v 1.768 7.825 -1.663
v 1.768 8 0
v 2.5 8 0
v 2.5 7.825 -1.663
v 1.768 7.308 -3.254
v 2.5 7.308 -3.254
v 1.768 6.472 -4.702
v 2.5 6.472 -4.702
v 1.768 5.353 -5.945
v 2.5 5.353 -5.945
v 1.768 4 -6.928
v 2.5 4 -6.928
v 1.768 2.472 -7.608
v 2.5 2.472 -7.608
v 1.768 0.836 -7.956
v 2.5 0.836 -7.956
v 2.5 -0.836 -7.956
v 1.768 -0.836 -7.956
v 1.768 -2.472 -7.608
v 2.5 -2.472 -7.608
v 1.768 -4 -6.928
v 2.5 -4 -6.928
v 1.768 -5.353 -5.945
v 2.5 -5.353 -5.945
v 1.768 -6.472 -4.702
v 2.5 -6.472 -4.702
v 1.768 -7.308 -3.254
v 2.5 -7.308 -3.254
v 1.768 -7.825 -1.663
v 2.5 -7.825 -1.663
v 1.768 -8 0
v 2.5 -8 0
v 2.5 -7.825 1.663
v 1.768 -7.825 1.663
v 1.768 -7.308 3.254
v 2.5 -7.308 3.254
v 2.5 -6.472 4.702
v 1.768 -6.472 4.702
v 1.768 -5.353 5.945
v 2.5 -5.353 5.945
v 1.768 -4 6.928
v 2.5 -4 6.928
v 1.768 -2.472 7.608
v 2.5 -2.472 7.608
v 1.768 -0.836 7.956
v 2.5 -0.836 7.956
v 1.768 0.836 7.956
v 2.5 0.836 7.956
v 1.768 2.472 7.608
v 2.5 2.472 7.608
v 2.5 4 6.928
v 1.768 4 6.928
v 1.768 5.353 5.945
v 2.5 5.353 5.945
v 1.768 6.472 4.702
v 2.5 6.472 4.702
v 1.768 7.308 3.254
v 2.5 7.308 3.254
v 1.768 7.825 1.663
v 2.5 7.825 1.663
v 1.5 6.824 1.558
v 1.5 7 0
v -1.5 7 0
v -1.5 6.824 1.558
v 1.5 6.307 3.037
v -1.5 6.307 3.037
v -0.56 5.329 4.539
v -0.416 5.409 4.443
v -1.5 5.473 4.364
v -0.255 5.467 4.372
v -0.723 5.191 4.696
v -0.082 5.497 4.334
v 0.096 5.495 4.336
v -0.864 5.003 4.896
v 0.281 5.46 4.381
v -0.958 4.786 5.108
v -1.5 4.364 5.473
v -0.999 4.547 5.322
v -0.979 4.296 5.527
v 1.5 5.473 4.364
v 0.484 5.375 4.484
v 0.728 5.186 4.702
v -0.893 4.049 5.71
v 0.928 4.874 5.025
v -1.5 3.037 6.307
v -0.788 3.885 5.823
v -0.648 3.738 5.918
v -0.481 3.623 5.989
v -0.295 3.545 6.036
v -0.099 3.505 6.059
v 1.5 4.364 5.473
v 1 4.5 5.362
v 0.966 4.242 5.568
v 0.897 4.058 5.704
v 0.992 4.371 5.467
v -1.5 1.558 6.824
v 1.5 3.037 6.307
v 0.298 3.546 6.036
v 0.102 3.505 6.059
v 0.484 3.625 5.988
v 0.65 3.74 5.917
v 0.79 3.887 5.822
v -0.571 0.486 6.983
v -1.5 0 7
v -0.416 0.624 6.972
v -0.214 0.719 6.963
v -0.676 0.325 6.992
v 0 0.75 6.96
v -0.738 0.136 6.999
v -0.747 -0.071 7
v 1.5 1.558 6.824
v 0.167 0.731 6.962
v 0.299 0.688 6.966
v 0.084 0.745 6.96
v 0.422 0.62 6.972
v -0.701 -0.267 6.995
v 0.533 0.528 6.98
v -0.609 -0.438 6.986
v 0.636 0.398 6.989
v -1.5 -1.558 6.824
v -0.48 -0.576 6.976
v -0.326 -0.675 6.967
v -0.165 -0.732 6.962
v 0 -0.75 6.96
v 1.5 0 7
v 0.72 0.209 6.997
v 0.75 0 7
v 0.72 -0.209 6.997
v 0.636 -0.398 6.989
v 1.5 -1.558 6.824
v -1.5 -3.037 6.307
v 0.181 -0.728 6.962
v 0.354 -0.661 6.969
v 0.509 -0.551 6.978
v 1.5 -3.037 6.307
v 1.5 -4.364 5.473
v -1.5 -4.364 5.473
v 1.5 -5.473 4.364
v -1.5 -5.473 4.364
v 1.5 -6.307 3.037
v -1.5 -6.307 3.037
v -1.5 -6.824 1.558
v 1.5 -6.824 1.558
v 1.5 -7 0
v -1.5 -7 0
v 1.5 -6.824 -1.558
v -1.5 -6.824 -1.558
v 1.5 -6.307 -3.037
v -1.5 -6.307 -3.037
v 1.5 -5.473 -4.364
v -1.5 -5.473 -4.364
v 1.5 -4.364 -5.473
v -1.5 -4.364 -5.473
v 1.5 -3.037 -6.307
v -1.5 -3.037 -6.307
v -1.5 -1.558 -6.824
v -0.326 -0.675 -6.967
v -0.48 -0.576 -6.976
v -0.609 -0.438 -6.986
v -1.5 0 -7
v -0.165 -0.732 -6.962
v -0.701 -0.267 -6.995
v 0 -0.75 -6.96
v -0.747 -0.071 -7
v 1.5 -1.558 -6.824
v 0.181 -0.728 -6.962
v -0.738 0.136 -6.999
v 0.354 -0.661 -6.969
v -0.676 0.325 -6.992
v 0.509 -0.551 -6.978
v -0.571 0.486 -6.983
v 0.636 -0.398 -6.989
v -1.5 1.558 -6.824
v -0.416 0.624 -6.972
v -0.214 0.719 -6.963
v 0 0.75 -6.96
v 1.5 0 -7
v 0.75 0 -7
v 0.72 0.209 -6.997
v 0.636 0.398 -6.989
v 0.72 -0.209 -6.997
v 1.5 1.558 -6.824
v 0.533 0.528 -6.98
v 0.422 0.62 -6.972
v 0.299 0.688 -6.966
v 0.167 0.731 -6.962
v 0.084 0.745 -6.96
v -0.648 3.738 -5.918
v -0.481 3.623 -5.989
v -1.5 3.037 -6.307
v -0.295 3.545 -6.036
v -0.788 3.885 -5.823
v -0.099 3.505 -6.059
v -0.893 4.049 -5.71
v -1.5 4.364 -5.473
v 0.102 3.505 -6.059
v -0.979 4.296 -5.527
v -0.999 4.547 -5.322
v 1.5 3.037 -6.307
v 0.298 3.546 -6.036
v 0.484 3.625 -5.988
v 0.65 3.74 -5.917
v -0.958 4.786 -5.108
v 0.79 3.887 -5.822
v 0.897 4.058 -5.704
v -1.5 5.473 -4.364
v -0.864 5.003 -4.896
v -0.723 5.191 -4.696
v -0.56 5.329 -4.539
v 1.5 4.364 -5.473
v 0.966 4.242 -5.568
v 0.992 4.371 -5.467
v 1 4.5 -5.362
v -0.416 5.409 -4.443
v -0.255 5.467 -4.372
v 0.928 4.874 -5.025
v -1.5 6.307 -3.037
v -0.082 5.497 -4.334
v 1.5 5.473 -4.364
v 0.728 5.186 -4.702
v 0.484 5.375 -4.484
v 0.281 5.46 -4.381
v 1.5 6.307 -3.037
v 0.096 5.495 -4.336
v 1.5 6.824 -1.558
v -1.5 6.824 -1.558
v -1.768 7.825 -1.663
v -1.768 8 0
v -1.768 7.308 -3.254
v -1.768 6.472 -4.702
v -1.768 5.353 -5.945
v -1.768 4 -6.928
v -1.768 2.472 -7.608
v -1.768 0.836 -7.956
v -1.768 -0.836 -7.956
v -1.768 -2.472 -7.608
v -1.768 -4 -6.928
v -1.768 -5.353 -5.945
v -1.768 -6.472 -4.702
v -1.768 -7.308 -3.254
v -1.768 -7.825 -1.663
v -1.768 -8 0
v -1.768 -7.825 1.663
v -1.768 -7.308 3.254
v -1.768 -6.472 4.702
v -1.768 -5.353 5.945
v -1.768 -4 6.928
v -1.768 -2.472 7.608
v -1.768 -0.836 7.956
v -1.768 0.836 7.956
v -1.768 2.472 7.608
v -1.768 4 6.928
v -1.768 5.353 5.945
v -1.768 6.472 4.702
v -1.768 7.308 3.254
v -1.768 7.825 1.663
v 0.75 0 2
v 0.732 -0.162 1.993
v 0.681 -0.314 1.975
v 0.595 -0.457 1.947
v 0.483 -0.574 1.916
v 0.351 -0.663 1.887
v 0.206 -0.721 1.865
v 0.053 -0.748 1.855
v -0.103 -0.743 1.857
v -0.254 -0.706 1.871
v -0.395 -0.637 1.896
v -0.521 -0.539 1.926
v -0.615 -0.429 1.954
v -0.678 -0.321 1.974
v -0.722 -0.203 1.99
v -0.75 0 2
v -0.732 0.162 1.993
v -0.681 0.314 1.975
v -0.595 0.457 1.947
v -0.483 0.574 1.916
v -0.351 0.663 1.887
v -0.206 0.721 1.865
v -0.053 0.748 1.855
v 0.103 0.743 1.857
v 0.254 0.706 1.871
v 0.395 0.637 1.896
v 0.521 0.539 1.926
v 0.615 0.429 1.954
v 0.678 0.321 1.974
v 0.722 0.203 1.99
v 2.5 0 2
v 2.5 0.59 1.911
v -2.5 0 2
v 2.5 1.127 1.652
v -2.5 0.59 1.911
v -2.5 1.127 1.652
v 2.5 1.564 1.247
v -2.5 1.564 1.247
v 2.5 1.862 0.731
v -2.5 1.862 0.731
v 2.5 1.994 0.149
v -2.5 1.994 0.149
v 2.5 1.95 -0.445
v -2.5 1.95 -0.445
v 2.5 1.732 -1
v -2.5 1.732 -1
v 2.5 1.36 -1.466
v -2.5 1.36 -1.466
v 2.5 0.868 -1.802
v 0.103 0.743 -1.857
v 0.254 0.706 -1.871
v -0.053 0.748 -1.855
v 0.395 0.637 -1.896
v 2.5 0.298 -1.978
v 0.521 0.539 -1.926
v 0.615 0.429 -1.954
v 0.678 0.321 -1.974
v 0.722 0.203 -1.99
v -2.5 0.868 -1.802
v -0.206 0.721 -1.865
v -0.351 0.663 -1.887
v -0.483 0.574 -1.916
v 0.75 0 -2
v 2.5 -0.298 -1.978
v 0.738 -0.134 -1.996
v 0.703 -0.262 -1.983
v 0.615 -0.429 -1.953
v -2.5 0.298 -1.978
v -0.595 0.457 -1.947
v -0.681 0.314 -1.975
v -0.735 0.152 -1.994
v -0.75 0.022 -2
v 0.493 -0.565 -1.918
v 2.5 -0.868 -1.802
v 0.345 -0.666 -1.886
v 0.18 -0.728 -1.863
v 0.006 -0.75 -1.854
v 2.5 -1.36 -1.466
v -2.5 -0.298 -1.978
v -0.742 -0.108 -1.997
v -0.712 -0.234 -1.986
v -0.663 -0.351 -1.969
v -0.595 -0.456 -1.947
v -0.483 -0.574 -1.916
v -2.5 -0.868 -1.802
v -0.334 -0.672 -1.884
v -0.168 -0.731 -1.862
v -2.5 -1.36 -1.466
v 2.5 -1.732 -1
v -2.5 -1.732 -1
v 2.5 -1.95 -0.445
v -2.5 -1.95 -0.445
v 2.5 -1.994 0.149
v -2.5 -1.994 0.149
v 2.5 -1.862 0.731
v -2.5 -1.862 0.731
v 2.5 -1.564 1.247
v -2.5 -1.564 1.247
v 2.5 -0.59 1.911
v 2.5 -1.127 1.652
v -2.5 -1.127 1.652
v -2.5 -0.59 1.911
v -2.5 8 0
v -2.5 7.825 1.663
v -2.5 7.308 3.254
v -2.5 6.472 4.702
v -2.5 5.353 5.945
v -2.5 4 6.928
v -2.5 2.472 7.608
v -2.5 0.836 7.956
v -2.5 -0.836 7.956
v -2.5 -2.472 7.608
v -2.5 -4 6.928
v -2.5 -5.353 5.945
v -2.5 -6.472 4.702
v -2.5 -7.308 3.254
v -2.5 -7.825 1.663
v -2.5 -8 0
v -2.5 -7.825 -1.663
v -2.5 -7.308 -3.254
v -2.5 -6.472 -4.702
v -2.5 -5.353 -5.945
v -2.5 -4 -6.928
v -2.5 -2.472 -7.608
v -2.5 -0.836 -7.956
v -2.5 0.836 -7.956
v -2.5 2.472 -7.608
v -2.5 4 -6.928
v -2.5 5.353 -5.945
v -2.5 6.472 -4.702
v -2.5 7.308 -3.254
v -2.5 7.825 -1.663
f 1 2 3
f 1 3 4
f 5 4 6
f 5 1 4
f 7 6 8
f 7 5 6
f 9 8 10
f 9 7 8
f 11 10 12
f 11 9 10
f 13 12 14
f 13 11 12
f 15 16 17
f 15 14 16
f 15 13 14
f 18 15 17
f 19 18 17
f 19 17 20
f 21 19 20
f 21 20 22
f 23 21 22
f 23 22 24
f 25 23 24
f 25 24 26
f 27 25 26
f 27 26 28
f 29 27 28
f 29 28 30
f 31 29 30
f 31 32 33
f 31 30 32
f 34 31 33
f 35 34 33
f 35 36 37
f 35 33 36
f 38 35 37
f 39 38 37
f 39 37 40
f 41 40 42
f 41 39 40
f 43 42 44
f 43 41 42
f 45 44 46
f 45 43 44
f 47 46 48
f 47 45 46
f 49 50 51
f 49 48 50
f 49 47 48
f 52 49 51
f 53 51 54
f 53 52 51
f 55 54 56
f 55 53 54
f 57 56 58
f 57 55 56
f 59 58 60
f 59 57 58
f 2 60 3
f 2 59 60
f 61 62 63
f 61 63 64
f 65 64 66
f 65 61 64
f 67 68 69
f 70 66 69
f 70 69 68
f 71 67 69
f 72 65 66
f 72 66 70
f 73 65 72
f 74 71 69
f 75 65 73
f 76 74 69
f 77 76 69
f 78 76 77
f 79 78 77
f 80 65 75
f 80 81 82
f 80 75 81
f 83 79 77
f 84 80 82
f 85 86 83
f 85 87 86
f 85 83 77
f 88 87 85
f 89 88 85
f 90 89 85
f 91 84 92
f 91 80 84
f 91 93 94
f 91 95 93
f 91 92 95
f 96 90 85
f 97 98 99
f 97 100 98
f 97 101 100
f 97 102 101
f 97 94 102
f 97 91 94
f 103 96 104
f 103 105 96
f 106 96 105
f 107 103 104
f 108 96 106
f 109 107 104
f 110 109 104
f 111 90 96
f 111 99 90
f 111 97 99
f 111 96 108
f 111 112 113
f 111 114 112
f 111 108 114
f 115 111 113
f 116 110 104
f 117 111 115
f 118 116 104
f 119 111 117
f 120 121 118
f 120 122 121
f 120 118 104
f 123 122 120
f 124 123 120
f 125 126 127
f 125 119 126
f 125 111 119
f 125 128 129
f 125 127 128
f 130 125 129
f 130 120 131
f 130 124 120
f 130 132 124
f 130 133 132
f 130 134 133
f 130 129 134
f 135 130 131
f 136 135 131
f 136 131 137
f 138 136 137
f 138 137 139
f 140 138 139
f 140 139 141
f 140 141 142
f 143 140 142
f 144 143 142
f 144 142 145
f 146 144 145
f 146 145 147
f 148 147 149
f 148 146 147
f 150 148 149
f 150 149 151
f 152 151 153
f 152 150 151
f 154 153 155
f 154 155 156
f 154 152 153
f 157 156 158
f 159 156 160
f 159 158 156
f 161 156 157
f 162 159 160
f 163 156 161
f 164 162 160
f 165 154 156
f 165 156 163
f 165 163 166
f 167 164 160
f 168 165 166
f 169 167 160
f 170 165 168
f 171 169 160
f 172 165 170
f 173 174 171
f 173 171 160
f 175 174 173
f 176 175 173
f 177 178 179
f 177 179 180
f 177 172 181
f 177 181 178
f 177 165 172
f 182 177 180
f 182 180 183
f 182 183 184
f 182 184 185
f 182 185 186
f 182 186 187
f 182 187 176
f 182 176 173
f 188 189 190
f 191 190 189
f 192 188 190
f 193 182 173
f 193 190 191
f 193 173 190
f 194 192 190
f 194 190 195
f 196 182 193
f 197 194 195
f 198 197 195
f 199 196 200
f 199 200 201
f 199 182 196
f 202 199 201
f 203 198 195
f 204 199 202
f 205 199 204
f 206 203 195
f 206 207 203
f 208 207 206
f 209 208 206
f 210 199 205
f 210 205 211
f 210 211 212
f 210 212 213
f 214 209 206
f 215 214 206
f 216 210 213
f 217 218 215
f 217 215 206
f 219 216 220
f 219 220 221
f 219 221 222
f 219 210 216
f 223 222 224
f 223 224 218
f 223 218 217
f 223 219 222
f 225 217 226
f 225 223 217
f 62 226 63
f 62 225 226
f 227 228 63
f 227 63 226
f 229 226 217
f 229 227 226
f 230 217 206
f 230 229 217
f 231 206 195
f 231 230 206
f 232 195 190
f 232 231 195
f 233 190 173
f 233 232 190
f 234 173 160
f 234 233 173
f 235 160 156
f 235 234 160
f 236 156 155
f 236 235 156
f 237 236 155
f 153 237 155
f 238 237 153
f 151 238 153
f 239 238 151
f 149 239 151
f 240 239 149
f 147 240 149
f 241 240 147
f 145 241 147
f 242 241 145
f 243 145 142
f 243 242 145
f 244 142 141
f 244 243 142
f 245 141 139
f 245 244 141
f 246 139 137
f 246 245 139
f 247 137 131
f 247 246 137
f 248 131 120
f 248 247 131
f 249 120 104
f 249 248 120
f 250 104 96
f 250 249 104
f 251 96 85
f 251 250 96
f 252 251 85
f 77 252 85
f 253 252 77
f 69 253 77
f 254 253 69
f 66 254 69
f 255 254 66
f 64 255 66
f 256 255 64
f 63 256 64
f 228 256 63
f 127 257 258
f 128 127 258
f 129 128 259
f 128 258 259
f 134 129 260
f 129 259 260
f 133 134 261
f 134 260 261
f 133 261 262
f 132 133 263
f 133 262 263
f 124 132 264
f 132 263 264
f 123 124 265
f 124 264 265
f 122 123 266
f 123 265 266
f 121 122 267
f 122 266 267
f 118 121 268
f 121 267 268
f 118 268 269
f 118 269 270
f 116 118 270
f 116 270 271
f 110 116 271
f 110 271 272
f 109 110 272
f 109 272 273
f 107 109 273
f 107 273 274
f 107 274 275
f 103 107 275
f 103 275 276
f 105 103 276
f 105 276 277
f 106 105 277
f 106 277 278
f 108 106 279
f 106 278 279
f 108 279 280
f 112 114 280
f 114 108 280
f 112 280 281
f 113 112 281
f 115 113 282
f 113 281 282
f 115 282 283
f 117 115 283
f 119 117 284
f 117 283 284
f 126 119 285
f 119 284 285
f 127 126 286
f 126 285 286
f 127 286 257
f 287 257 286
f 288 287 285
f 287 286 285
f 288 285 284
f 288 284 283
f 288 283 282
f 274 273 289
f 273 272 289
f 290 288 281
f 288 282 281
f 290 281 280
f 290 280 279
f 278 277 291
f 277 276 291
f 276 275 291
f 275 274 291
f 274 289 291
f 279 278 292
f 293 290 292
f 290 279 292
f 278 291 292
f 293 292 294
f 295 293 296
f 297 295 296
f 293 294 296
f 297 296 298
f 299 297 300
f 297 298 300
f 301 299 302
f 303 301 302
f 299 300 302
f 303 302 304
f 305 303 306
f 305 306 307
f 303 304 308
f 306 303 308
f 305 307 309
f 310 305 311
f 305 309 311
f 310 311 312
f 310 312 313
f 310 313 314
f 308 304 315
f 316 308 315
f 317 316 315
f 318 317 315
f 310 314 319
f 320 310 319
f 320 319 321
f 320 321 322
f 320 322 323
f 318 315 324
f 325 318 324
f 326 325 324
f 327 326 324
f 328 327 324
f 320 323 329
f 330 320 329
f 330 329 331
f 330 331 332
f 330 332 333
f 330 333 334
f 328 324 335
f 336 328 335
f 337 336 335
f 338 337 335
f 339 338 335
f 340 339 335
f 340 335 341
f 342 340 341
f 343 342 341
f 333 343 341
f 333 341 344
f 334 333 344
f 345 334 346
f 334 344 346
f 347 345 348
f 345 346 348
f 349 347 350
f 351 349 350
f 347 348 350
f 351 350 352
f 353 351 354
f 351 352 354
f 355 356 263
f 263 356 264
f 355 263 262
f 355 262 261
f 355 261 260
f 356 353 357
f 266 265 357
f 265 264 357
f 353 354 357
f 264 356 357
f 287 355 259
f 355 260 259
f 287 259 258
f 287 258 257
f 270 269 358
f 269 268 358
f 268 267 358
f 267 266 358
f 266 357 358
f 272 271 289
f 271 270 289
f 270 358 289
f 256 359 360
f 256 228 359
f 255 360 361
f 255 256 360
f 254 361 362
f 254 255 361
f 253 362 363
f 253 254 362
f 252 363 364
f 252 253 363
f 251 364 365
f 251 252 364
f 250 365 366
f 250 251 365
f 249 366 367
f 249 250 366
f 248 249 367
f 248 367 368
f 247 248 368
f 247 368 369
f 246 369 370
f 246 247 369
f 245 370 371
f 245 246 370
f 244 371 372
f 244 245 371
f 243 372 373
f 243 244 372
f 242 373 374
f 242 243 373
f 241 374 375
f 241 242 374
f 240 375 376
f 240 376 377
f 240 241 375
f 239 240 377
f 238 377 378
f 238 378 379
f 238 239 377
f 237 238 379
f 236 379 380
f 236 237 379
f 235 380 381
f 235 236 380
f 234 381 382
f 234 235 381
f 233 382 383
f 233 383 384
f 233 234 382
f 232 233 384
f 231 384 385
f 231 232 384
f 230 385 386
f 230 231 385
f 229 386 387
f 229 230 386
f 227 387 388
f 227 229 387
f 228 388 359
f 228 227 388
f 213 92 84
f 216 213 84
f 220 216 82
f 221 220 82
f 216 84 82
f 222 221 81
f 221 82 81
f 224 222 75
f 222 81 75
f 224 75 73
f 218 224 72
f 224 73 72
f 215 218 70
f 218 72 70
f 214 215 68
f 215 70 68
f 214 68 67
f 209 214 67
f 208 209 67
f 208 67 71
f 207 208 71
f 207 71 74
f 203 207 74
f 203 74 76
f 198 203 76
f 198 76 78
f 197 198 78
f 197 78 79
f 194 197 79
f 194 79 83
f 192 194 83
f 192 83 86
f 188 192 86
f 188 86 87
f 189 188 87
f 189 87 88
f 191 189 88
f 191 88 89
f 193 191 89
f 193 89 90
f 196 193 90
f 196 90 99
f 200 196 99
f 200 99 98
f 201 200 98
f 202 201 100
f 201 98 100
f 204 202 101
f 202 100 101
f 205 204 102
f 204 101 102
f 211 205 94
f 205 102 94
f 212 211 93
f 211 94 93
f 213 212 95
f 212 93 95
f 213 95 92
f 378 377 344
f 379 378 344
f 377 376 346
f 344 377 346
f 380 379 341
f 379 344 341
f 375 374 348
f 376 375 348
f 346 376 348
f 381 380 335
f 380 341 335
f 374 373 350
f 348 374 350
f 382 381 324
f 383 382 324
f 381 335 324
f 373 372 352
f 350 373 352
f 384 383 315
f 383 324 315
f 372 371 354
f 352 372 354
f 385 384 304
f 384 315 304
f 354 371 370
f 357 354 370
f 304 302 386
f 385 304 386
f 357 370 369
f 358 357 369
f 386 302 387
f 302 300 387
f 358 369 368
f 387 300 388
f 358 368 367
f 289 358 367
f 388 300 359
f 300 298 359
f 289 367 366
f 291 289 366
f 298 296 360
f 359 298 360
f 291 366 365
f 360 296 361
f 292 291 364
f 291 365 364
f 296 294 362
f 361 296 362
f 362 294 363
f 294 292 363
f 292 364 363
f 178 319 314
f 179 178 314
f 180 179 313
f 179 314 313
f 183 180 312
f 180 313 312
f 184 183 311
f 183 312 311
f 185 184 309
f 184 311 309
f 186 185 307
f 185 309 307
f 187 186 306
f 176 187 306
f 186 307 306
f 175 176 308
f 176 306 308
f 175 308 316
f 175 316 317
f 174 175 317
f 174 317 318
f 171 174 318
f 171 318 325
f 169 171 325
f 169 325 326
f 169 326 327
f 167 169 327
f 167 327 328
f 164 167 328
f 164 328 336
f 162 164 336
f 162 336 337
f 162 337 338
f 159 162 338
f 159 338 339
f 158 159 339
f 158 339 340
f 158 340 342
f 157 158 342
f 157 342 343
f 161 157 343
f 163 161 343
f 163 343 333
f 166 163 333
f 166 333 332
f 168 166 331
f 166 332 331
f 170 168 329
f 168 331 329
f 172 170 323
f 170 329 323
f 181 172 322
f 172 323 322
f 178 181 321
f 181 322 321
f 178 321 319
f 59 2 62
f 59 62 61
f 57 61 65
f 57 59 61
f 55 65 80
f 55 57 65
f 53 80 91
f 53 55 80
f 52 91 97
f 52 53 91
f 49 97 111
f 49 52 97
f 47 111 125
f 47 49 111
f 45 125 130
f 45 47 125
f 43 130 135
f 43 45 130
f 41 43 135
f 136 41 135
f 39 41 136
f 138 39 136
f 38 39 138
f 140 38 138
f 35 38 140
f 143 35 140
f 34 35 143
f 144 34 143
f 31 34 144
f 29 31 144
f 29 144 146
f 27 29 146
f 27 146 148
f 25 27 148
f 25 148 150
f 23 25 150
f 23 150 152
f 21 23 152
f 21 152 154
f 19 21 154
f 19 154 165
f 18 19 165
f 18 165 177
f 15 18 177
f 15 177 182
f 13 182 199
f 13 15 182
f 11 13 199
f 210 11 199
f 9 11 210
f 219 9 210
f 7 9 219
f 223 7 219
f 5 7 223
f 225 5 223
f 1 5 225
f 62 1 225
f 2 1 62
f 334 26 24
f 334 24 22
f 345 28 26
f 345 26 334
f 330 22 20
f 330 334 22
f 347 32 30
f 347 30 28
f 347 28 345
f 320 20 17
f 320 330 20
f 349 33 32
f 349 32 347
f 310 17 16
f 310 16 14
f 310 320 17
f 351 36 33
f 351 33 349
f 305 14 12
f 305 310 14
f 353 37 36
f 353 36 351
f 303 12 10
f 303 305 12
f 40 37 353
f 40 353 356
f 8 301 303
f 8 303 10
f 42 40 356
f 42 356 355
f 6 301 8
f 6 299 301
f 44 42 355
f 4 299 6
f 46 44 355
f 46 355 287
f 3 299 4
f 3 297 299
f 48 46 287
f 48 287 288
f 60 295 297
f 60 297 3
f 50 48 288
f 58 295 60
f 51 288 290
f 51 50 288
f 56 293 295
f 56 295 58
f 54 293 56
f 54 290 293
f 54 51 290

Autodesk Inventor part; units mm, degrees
ref_plane "YZ Plane" through (0, 0, 0) normal (1, 0, 0) x (0, 1, 0)
ref_plane "XZ Plane" through (0, 0, 0) normal (0, 1, 0) x (-1, 0, 0)
ref_plane "XY Plane" through (0, 0, 0) normal (0, 0, 1) x (1, 0, 0)
sketch "Sketch1" plane through (0, 0, 0) normal (0, 0, 1) x (1, 0, 0)
  line L0 (-2.5, 0) -> (-2.5, 8)
  line L1 (-2.5, 8) -> (-1.7679, 8)
  line L2 (-1.7679, 8) -> (-1.5, 7)
  line L3 (-1.5, 7) -> (0, 7)
  line L4 (0, 0) -> (0, 14.5205) construction
  line L5 (-2.5, 0) -> (2.5, 0)
  line L6 (2.5, 0) -> (2.5, 8)
  line L7 (2.5, 8) -> (1.7679, 8)
  line L8 (1.7679, 8) -> (1.5, 7)
  line L9 (1.5, 7) -> (0, 7)
  dimension "d0" = 5
  dimension "d1" = 16
  dimension "d2" = 14
  dimension "d3" = 3
  dimension "d4" = 15
revolve "Revolution1" add sketch "Sketch1" angle 360 about axis through (-2.5, 0, 0) along (1, 0, 0)
sketch "Sketch2" plane through (0, 0, 0) normal (0, 0, 1) x (1, 0, 0)
  circle A0 centre (0, 0) radius 0.75
  dimension "d6" = 1.5
extrude "Extrusion1" cut sketch "Sketch2" along normal blind 10 and the other way blind 10
sketch "Sketch4" plane through (-2.5, 0, 0) normal (-1, 0, 0) x (0, 0, 1)
  circle A0 centre (0, 0) radius 2
  dimension "d18" = 4
extrude "Extrusion2" cut sketch "Sketch4" against normal through all
sketch "Sketch7" plane through (0, 0, 0) normal (0, 0, 1) x (1, 0, 0)
  circle A0 centre (0, 4.5) radius 1
  point P0 (0, 0)
  dimension "d32" = 2
  dimension "d33" = 4.5
extrude "Extrusion3" cut sketch "Sketch7" along normal through all both and the other way through all
properties part number "spool v2"
